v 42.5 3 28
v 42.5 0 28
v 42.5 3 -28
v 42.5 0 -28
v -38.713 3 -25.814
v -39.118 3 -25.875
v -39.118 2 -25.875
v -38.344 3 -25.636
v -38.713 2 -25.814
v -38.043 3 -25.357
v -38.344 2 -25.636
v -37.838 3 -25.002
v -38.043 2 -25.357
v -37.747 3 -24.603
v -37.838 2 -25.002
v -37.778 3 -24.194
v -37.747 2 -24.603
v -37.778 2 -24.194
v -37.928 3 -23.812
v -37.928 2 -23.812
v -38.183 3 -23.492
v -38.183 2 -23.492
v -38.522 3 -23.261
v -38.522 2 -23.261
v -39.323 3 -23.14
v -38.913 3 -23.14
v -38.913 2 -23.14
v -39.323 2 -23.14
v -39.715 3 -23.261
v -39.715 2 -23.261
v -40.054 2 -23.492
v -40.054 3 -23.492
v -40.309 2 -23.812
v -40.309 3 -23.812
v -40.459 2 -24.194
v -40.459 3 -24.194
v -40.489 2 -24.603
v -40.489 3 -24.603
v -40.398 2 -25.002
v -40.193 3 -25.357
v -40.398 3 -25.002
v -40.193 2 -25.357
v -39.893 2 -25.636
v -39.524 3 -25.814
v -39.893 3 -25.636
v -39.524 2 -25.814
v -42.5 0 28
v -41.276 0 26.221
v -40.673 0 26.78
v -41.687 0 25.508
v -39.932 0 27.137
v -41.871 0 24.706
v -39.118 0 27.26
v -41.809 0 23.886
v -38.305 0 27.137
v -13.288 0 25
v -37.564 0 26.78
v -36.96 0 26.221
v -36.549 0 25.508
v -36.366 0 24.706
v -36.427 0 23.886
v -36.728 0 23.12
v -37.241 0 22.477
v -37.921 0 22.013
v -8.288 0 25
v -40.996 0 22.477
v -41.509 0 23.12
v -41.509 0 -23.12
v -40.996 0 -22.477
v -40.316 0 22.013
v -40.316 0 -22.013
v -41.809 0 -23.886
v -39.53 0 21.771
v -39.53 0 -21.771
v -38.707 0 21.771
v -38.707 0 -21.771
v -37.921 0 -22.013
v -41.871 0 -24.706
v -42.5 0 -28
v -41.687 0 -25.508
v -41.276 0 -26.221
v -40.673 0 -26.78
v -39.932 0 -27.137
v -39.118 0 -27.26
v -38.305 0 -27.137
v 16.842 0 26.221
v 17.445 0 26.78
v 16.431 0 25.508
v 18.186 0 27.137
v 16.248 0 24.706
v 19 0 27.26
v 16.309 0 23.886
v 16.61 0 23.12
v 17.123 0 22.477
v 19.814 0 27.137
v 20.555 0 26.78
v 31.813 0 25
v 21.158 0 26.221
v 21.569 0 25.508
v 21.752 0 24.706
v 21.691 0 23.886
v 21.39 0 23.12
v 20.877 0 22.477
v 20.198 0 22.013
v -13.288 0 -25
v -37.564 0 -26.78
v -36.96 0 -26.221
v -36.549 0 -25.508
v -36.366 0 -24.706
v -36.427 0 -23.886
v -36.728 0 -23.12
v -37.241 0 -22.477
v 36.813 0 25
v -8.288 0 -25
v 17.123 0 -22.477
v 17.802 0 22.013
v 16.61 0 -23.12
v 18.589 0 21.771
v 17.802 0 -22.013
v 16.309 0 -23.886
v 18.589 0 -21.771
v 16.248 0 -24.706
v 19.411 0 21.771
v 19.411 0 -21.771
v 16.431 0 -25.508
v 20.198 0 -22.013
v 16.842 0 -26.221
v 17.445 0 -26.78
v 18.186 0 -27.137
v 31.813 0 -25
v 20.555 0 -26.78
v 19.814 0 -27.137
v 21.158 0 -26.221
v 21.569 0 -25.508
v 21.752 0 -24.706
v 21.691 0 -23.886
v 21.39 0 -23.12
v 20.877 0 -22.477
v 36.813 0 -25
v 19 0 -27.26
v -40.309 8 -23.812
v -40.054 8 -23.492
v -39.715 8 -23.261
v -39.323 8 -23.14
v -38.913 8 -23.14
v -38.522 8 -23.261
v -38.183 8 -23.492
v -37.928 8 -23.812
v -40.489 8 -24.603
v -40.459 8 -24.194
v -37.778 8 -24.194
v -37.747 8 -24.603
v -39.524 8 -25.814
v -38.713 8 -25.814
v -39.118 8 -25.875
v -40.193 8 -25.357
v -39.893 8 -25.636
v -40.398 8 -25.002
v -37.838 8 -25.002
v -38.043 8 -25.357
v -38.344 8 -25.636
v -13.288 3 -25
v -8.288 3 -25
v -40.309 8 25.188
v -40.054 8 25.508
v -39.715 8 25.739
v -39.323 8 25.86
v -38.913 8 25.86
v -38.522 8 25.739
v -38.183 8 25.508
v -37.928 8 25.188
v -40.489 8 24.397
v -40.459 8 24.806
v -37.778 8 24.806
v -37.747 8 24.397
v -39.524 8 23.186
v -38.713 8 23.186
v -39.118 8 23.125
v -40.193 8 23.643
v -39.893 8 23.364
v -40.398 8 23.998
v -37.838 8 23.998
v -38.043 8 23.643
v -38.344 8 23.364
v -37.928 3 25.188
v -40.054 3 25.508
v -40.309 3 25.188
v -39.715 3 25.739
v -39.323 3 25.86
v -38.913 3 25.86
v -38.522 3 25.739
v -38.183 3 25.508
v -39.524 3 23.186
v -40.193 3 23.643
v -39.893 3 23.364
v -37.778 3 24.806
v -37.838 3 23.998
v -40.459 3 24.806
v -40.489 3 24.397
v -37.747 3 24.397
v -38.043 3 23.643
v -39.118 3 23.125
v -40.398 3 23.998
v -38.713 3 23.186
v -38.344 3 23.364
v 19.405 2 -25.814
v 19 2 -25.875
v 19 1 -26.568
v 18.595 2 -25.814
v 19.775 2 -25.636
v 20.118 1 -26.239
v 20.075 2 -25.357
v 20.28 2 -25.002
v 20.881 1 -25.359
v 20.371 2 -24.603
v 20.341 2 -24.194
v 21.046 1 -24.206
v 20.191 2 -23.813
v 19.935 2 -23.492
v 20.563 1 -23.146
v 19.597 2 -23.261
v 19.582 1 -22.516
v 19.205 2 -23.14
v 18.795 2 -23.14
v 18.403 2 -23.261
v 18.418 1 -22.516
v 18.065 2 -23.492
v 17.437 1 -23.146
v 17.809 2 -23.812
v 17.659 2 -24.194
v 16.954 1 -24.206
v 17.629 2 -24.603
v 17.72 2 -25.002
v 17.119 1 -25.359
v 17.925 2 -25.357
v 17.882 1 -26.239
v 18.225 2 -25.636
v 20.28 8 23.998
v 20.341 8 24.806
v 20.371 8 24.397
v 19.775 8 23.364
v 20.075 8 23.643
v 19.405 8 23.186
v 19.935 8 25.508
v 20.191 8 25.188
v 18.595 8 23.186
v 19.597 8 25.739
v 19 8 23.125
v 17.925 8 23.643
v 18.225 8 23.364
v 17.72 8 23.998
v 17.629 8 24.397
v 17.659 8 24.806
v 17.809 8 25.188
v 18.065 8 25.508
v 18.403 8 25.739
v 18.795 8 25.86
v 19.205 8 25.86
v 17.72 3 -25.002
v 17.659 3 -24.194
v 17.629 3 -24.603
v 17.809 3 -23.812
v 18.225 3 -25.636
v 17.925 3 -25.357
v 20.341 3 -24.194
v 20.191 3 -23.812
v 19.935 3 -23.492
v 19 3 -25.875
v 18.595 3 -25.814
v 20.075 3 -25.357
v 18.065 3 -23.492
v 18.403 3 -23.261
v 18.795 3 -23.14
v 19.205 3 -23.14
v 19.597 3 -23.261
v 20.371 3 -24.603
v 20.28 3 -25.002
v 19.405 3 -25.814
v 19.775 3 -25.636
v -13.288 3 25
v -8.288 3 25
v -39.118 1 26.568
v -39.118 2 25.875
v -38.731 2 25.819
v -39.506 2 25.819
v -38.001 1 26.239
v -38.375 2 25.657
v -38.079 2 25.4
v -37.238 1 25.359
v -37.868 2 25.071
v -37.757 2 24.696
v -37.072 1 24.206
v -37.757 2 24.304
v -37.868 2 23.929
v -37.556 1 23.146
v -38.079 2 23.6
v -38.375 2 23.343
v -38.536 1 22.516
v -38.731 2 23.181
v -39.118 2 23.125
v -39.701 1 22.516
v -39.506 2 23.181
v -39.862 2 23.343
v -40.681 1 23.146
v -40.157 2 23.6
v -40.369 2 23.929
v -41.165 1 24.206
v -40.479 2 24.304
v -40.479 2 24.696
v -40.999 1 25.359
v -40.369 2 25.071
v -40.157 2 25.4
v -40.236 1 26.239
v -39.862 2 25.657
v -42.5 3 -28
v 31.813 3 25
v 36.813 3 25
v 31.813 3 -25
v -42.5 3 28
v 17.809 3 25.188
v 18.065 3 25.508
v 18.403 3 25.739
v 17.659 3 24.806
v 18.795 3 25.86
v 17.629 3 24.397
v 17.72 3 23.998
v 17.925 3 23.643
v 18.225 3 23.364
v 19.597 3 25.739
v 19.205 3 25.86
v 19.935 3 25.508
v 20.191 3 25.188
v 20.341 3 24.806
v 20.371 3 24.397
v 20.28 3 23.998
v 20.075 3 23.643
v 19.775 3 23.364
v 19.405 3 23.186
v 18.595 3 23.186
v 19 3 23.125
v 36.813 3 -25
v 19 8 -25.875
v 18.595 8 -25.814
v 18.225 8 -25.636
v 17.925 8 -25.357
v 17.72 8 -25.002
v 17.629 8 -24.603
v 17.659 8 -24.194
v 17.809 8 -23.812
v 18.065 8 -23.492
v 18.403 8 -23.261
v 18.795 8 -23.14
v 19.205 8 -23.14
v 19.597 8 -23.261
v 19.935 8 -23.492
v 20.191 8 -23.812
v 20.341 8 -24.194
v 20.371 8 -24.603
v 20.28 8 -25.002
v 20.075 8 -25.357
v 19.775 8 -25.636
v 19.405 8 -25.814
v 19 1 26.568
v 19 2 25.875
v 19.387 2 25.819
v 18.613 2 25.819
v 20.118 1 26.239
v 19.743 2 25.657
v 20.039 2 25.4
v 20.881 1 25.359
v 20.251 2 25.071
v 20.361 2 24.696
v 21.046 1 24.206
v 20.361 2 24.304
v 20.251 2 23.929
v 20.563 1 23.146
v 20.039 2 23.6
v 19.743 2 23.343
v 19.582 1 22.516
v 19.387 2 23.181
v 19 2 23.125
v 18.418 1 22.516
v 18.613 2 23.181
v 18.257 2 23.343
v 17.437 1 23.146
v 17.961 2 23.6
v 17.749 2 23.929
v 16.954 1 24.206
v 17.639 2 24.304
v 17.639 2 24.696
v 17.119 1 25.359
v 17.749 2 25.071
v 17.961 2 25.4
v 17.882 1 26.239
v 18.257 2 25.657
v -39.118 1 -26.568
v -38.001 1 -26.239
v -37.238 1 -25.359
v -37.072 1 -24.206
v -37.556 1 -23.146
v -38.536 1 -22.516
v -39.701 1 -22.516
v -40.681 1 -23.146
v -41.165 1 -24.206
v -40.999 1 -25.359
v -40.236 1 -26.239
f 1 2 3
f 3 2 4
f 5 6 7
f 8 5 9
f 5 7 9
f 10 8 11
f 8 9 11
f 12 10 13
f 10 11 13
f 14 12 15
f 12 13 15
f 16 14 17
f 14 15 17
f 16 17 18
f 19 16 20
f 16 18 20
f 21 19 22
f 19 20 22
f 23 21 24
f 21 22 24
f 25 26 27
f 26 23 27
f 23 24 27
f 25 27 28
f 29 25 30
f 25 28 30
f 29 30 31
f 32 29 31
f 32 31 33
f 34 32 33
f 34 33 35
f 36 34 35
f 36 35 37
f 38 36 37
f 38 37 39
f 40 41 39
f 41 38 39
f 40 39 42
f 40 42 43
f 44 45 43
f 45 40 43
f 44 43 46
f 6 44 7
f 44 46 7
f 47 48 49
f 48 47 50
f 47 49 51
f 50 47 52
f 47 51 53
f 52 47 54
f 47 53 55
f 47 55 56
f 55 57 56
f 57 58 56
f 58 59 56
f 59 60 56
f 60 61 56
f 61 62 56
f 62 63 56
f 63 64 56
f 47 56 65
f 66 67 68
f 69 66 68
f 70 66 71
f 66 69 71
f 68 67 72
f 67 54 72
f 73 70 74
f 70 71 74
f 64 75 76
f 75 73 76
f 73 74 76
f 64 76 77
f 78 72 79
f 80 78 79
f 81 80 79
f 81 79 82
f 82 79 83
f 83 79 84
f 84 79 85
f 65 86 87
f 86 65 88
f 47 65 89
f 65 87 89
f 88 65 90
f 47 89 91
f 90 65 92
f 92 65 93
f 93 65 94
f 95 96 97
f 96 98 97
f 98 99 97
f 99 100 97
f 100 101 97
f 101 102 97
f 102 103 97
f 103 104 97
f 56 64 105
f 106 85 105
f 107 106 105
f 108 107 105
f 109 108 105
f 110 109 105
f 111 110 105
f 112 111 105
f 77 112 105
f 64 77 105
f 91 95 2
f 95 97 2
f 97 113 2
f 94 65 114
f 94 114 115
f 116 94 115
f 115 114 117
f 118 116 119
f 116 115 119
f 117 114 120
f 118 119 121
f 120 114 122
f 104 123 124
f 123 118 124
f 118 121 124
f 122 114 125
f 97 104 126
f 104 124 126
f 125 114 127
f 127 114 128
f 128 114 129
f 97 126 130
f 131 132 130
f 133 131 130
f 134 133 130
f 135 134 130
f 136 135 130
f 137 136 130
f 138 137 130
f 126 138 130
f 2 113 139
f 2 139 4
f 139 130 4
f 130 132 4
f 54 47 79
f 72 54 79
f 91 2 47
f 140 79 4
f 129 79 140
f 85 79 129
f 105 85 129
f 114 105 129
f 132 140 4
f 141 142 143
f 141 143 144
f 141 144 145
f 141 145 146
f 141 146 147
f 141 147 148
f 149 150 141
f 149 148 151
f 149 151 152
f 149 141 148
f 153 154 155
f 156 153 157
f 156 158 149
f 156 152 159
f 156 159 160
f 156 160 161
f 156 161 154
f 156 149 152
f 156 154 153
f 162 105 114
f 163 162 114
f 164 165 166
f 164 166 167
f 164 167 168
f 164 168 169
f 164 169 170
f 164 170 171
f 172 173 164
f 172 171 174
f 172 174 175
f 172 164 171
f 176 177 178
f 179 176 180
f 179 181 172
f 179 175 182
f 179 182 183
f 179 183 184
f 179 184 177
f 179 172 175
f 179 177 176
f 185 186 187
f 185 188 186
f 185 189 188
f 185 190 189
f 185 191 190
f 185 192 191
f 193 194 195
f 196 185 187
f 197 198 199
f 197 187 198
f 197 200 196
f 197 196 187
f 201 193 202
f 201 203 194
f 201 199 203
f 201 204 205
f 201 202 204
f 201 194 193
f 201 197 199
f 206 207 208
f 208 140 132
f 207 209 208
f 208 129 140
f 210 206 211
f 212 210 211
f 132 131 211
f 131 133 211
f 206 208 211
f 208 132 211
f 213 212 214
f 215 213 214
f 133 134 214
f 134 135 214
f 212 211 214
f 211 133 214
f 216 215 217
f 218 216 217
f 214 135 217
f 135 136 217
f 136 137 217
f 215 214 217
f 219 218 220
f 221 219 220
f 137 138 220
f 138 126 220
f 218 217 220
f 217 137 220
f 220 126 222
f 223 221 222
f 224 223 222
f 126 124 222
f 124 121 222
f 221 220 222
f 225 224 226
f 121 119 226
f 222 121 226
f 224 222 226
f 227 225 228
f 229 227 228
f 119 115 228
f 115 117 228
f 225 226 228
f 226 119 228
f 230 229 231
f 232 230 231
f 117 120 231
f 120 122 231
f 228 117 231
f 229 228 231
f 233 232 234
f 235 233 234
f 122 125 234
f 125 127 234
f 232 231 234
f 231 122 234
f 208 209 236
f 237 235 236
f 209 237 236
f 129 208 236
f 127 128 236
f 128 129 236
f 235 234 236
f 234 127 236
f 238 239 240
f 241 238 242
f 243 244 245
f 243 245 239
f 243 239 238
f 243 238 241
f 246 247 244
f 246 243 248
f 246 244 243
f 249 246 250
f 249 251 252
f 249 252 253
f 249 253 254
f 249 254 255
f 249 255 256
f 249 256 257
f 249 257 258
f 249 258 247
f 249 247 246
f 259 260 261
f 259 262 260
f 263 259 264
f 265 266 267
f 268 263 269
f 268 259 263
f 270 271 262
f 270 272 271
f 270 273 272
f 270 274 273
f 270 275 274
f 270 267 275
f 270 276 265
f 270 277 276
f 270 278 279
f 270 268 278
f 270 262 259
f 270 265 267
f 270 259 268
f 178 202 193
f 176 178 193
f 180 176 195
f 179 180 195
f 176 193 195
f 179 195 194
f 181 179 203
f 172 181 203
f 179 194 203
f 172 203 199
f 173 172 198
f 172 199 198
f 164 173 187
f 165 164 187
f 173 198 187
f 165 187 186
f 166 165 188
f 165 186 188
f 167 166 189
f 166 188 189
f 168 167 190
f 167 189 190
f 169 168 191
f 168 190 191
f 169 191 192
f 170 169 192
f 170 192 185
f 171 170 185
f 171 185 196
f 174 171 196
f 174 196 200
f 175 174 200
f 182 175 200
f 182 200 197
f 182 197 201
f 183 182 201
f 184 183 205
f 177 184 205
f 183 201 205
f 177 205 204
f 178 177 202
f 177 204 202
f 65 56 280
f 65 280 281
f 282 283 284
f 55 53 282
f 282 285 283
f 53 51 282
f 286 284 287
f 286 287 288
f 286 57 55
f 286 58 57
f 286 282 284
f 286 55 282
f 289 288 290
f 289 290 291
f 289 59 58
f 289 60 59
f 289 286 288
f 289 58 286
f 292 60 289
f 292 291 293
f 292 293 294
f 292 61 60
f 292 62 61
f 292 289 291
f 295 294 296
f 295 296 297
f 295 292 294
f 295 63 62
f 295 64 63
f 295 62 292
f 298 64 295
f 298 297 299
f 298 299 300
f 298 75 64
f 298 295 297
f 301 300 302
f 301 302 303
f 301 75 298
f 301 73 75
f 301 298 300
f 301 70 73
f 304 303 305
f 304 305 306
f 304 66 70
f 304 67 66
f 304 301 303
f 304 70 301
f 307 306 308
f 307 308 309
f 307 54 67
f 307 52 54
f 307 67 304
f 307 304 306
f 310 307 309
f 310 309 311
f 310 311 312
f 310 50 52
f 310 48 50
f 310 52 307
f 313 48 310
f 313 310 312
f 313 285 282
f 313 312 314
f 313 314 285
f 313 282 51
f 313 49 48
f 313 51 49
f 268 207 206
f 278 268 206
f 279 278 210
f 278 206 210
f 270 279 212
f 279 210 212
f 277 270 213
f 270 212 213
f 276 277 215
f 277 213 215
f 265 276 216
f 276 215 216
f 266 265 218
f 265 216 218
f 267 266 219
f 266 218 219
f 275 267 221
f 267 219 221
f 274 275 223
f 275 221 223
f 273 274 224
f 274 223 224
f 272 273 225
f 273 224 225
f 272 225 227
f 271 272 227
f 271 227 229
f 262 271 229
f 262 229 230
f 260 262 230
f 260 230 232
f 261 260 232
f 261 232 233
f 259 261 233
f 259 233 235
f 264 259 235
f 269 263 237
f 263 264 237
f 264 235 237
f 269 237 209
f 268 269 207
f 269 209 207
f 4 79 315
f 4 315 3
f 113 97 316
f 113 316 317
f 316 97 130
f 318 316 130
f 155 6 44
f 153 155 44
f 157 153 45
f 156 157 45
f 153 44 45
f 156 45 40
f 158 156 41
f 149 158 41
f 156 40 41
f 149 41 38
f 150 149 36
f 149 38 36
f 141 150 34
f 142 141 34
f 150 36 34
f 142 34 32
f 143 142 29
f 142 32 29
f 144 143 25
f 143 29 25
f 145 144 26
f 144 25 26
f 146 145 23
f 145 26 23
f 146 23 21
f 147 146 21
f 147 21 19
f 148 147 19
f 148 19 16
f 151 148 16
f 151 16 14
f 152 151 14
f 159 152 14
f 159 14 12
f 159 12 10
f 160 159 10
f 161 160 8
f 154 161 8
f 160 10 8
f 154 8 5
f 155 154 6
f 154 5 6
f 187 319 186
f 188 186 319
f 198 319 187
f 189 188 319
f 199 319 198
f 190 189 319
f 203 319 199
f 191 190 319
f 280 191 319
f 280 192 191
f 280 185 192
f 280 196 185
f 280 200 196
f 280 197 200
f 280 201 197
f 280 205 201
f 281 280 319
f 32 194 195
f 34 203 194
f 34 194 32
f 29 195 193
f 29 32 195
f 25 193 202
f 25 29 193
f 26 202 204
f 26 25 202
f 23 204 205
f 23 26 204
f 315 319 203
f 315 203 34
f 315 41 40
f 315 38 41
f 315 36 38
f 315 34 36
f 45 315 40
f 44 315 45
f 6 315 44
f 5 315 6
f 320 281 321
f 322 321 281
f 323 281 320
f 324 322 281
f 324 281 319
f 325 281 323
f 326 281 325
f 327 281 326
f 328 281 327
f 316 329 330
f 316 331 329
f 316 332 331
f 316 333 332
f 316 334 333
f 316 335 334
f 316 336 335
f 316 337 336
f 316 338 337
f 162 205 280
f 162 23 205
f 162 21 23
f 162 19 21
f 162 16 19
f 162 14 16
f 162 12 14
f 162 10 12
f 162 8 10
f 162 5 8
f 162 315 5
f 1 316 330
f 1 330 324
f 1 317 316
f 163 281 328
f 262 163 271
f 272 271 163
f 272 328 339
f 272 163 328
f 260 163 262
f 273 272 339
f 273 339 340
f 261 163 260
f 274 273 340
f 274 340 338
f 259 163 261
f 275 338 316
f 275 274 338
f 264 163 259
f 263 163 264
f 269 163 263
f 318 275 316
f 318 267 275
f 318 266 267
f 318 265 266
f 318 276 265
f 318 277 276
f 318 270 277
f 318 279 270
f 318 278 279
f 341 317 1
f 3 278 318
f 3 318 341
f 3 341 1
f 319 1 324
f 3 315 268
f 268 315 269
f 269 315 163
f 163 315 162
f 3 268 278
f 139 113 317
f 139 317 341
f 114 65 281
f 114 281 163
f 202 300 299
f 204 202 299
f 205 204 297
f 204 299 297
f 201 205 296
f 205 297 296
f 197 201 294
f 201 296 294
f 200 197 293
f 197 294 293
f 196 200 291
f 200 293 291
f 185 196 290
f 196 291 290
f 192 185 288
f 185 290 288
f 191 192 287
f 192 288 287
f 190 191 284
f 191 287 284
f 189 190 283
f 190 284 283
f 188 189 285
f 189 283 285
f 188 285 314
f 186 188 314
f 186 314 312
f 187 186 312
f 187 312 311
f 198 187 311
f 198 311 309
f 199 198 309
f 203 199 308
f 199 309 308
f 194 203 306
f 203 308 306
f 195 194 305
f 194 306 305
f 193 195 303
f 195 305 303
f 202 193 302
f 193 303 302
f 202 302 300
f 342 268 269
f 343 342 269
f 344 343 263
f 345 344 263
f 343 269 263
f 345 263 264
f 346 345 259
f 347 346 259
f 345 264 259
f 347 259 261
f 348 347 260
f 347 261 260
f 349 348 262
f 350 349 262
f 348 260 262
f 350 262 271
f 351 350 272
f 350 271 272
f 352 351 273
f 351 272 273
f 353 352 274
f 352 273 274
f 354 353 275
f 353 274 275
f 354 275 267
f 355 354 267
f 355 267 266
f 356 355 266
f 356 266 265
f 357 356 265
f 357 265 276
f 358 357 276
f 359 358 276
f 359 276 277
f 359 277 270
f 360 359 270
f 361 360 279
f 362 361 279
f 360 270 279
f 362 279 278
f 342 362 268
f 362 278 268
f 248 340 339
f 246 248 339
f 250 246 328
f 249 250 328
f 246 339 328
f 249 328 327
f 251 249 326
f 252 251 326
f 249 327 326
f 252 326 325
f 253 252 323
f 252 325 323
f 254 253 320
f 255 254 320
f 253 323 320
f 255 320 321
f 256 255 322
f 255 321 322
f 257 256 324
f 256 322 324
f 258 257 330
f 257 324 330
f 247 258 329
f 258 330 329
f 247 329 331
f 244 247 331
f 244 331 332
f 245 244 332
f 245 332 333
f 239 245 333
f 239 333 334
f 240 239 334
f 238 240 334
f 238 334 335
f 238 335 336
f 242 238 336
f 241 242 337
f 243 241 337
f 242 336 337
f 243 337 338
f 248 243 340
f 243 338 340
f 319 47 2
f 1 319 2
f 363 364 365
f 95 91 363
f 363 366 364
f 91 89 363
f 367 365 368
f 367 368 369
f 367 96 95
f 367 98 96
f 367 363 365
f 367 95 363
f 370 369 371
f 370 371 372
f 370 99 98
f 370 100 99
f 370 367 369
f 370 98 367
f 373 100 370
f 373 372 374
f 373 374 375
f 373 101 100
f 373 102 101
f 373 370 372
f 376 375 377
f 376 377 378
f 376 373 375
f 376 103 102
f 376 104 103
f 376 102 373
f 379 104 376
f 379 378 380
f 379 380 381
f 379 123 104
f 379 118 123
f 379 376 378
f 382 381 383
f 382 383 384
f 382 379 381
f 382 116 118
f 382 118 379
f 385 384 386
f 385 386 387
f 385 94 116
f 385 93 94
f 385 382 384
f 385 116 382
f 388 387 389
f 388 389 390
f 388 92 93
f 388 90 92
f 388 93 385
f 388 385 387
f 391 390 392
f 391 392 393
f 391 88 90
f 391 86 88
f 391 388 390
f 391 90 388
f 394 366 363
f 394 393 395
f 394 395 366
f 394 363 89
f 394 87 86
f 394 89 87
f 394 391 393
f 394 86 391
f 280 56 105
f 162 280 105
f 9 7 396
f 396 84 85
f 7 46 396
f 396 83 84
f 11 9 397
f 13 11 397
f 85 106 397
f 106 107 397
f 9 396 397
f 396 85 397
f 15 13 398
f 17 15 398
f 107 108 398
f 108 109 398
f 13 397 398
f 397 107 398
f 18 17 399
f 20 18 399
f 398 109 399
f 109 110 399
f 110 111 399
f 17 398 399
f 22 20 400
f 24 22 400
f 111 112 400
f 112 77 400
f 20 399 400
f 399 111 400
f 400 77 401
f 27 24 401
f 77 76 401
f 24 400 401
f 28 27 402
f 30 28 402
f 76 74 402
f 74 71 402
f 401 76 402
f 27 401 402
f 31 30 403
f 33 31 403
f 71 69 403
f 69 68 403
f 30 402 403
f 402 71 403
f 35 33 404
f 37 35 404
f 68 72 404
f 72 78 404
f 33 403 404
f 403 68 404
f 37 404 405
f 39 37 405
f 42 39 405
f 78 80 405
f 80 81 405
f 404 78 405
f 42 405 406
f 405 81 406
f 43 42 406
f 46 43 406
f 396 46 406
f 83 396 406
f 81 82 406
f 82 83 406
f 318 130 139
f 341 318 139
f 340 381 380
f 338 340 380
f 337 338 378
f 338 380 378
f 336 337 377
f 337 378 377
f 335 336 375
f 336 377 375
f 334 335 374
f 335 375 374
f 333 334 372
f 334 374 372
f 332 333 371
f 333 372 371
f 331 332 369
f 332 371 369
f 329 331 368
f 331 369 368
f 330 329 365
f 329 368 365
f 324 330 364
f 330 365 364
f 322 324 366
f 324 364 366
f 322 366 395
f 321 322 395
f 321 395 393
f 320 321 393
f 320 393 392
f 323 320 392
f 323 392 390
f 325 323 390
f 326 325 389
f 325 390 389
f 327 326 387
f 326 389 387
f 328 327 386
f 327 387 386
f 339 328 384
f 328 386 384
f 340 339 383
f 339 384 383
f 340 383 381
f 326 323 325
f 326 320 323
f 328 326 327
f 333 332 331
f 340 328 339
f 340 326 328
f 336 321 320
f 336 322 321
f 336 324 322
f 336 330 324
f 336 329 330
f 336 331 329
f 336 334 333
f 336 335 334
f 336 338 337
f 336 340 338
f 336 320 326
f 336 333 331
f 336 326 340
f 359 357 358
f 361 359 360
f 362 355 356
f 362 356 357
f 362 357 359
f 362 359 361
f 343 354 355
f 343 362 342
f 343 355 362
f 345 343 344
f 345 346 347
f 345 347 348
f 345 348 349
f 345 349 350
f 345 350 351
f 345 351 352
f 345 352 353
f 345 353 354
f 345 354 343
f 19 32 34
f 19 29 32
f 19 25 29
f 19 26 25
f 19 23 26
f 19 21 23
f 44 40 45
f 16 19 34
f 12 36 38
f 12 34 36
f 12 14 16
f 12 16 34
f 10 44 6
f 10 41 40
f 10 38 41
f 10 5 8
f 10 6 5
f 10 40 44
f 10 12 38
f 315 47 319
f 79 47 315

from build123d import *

# Parameters (mm, degrees)
ESQUISSE1_W             = 85
ESQUISSE1_H             = 56
ESQUISSE1_W_2           = 5
ESQUISSE1_H_2           = 50
BASE_DEPTH              = 3
ESQUISSE2_R             = 1.375
BOSS_ENTRETOISE_DEPTH   = 5
ESQUISSE3_R             = 1.375
ENL_V_MAT_EXTRU_1_DEPTH = 3


with BuildPart() as part:
    # Esquisse1 → BASE (new body)
    with BuildSketch(Plane(origin=(0, 0, 0), x_dir=(1, 0, 0), z_dir=(0, 1, 0))):
        Rectangle(ESQUISSE1_W, ESQUISSE1_H)
        with Locations((-10.787560704, 0)):
            Rectangle(ESQUISSE1_W_2, ESQUISSE1_H_2, mode=Mode.SUBTRACT)
        with Locations((34.31333568, 0)):
            Rectangle(ESQUISSE1_W_2, ESQUISSE1_H_2, mode=Mode.SUBTRACT)
    extrude(amount=BASE_DEPTH)

    # Esquisse2 → BOSS - ENTRETOISE (add)
    with BuildSketch(Plane(origin=(0, 3, 0), x_dir=(1, 0, 0), z_dir=(0, 1, 0))):
        with Locations(Location((-39.118286513, 24.5, 0), (0, 0, 90))):
            Circle(ESQUISSE2_R)
        with Locations(Location((-39.118286513, -24.5, 0), (0, 0, 90))):
            Circle(ESQUISSE2_R)
        with Locations(Location((19, 24.5, 0), (0, 0, 90))):
            Circle(ESQUISSE2_R)
        with Locations(Location((19, -24.5, 0), (0, 0, 90))):
            Circle(ESQUISSE2_R)
    extrude(amount=BOSS_ENTRETOISE_DEPTH)

    # Esquisse3 → Enlèv. mat.-Extru.1 (cut)
    with BuildSketch(Plane.XZ):
        with Locations(Location((19, 24.5, 0), (0, 0, 270))):
            Circle(ESQUISSE3_R)
        with Locations(Location((19, -24.5, 0), (0, 0, 270))):
            Circle(ESQUISSE3_R)
        with Locations(Location((-39.118286513, -24.5, 0), (0, 0, 270))):
            Circle(ESQUISSE3_R)
        with Locations(Location((-39.118286513, 24.5, 0), (0, 0, 270))):
            Circle(ESQUISSE3_R)
    extrude(amount=-ENL_V_MAT_EXTRU_1_DEPTH, mode=Mode.SUBTRACT)


with BuildPart() as enl_v_mat_extru_1_piece_1:
    # of the separate pieces the step leaves, piece 1, a body of its own (enl_v_mat_extru_1_pieces)
    add(part.part.solids().sort_by_distance((42.5, 0, -28))[0])

    # Esquisse4 → VIDE VIS 1 (revolve, cut)
    with BuildSketch(Plane.XY.offset(-24.5), mode=Mode.PRIVATE) as vide_vis_1_sk:
        Polygon((19, 2), (20.375, 2), (21.76, 0), (19, 0), align=None)
    vide_vis_1 = revolve(vide_vis_1_sk.sketch.rotate(Axis((19, 3, -24.5), (0, -1, 0)), 270), axis=Axis((19, 3, -24.5), (0, -1, 0)), mode=Mode.SUBTRACT)

    # Esquisse5 → VIDE VIS 2 (revolve, cut)
    with BuildSketch(Plane.XY.offset(-24.5), mode=Mode.PRIVATE) as vide_vis_2_sk:
        Polygon((-39.118286513, 2), (-37.743286513, 2), (-36.358286513, 0), (-39.118286513, 0), align=None)
    vide_vis_2 = revolve(vide_vis_2_sk.sketch.rotate(Axis((-39.118286513, 3, -24.5), (0, -1, 0)), 270), axis=Axis((-39.118286513, 3, -24.5), (0, -1, 0)), mode=Mode.SUBTRACT)

    # SYM VIS: VIDE VIS 1, VIDE VIS 2 across plane
    add(vide_vis_1.mirror(Plane.XY), mode=Mode.SUBTRACT)
    add(vide_vis_2.mirror(Plane.XY), mode=Mode.SUBTRACT)


with BuildPart() as enl_v_mat_extru_1_piece_2:
    # of the separate pieces the step leaves, piece 2, a body of its own (enl_v_mat_extru_1_pieces)
    add(part.part.solids().sort_by_distance((-39.118286513, 8, 23.125))[0])


with BuildPart() as enl_v_mat_extru_1_piece_3:
    # of the separate pieces the step leaves, piece 3, a body of its own (enl_v_mat_extru_1_pieces)
    add(part.part.solids().sort_by_distance((-39.118286513, 8, -25.875))[0])


with BuildPart() as enl_v_mat_extru_1_piece_4:
    # of the separate pieces the step leaves, piece 4, a body of its own (enl_v_mat_extru_1_pieces)
    add(part.part.solids().sort_by_distance((19, 8, -25.875))[0])


with BuildPart() as enl_v_mat_extru_1_piece_5:
    # of the separate pieces the step leaves, piece 5, a body of its own (enl_v_mat_extru_1_pieces)
    add(part.part.solids().sort_by_distance((19, 8, 23.125))[0])


solid = Compound([enl_v_mat_extru_1_piece_1.part, enl_v_mat_extru_1_piece_2.part, enl_v_mat_extru_1_piece_3.part, enl_v_mat_extru_1_piece_4.part, enl_v_mat_extru_1_piece_5.part])
